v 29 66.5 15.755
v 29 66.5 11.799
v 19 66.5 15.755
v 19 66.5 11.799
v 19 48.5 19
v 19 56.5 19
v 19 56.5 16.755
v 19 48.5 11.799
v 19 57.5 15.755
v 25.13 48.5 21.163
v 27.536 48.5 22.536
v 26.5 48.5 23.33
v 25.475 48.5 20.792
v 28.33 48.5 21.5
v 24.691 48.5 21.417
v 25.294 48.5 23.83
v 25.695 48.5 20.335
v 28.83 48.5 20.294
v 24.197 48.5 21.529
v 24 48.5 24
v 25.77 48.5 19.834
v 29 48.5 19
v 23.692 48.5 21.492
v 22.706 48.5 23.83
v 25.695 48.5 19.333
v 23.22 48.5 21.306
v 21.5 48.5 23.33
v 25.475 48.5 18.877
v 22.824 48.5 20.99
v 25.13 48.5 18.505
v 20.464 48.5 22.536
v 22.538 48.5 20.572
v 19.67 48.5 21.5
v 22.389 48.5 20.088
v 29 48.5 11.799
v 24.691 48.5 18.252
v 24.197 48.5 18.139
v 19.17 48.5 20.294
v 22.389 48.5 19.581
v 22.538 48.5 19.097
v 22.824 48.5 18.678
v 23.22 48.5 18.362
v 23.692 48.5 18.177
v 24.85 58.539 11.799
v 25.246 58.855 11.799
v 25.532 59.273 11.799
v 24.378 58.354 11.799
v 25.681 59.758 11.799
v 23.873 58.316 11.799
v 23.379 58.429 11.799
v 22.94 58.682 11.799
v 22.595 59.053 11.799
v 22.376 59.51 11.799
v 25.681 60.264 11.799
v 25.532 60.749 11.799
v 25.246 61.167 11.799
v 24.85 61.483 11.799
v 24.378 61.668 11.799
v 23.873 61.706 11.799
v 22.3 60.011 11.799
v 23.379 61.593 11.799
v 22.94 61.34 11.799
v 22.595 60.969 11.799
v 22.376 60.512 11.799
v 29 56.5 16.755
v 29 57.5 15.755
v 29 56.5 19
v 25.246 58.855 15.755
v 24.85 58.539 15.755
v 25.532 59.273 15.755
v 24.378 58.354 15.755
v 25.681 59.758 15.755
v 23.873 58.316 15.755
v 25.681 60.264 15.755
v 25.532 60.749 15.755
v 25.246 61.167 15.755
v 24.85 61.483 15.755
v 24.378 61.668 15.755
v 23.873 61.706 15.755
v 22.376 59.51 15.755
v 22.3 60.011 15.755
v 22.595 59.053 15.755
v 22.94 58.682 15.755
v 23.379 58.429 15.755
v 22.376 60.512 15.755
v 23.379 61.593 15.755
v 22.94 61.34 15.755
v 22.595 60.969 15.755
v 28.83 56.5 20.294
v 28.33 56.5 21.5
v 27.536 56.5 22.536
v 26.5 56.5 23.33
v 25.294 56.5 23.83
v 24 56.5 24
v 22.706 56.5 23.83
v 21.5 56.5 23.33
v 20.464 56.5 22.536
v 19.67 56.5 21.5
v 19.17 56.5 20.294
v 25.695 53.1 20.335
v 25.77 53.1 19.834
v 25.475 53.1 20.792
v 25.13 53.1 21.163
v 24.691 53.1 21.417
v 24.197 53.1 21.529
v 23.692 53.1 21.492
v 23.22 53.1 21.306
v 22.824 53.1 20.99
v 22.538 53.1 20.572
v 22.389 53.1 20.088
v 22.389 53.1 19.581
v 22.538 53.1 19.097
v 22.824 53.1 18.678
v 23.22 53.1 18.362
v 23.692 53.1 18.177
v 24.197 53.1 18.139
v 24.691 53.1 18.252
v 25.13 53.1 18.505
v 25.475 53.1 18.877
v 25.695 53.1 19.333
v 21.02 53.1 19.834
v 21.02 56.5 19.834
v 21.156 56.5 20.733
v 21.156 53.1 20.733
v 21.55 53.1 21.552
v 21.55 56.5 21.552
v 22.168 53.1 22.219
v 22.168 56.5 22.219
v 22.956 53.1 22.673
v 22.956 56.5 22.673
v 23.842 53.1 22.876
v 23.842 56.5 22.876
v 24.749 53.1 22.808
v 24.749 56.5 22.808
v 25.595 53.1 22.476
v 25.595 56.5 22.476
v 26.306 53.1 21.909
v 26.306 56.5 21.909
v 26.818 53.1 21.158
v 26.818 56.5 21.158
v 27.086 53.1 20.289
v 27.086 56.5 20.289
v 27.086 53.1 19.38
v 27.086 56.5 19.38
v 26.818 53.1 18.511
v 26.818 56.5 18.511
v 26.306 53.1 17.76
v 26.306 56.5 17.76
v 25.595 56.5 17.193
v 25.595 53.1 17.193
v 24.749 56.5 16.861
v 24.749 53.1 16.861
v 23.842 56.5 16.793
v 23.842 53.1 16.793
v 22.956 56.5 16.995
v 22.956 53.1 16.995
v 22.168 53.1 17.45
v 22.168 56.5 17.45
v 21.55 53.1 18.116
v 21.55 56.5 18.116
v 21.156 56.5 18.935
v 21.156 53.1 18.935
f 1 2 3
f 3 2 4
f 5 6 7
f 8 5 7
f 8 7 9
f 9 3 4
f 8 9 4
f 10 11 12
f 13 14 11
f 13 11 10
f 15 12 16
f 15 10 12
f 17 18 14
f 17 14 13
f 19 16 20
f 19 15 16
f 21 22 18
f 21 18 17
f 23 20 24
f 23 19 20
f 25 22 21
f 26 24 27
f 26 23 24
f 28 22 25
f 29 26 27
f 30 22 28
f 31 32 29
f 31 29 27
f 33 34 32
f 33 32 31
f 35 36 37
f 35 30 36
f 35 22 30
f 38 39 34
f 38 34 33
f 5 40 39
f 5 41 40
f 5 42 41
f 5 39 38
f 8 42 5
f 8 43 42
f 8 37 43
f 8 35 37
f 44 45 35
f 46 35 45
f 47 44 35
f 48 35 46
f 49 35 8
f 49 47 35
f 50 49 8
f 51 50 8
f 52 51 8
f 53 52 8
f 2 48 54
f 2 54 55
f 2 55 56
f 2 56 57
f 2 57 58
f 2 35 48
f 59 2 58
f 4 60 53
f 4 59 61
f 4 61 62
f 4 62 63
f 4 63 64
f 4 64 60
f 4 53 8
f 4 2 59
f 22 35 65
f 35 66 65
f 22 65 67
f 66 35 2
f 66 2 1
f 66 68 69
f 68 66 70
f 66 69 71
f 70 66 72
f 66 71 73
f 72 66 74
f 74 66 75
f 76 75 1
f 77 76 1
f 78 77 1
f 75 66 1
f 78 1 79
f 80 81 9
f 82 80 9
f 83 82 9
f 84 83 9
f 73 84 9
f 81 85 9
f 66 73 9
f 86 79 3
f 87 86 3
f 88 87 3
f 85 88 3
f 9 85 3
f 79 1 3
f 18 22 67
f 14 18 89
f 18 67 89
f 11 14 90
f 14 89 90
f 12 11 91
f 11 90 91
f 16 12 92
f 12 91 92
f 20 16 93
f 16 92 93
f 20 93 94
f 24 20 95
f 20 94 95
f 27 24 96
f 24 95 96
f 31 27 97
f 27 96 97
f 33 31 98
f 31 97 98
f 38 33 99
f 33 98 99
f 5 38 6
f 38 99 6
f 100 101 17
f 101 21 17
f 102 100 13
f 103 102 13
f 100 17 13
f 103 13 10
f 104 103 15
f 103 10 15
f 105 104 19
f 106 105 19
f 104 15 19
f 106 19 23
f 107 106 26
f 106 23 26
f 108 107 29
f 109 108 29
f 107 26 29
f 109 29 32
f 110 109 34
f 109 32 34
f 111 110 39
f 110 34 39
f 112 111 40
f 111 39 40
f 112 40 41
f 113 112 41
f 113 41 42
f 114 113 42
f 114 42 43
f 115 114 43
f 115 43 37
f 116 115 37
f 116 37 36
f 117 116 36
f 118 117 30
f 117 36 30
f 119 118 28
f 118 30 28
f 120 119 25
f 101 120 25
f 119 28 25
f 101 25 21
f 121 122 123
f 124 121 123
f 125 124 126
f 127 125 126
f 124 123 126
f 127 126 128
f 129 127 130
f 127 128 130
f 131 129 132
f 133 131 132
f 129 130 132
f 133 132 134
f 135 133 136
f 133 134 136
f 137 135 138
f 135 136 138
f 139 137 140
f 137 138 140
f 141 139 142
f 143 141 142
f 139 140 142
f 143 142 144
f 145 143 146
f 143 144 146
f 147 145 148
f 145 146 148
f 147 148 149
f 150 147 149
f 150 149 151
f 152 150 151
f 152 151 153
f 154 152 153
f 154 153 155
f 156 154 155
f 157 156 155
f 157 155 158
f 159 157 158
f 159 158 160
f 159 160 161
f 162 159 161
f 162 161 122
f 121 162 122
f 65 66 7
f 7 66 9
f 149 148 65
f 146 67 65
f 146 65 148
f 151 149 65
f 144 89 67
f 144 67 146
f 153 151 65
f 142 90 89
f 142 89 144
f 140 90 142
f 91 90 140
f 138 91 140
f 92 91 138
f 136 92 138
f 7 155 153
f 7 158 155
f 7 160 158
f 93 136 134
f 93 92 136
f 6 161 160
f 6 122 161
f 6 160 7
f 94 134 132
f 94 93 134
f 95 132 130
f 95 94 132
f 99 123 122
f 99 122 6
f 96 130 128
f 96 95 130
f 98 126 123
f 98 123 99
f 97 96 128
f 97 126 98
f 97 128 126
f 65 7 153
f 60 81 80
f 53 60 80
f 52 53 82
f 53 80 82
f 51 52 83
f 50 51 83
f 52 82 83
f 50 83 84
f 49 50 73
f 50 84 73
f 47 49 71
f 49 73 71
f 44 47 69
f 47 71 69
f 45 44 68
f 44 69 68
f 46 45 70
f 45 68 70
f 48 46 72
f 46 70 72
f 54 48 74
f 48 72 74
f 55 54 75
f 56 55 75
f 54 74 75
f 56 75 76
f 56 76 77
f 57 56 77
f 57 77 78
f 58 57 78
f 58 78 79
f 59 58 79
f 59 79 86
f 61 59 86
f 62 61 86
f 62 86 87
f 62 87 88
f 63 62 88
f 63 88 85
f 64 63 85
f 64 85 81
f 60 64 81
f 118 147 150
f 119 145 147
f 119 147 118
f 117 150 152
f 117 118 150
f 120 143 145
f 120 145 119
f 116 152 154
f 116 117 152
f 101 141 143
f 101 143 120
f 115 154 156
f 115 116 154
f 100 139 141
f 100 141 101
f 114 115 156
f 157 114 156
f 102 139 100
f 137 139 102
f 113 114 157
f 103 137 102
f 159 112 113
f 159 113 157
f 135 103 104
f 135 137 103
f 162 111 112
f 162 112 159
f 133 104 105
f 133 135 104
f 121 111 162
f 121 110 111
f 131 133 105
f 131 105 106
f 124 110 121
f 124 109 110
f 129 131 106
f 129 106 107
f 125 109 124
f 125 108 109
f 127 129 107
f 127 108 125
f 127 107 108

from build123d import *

# Parameters (mm, degrees)
PAD020_DEPTH            = 18
SKETCH034_W             = 12.810354
SKETCH034_H             = 8.636197
POCKET003_DEPTH         = 10
HOLE007_D               = 3.4
HOLE007_DEPTH           = 25
HOLE007_CBORE_D         = 6.1
HOLE007_CBORE_DEPTH     = 3.4
SKETCH037_R             = 1.7
HOLE008_DEPTH           = 25
CHAMFER001_SIZE         = 1
BODY020_PLACEMENT_ANGLE = 180


with BuildPart() as part:
    # Sketch033 → Pad020 (new body)
    with BuildSketch(Plane.XZ):
        with BuildLine():
            ThreePointArc((-5, 0), (0, -5), (5, 0))
            Line((5, 0), (5, 7.200889))
            Line((-5, 7.200889), (5, 7.200889))
            Line((-5, 7.200889), (-5, 0))
        make_face()
    extrude(amount=PAD020_DEPTH)

    # Sketch034 (on Face5 of Pad020) → Pocket003 (cut)
    with BuildSketch(Plane(origin=(0, 0, 0), x_dir=(1, 0, 0), z_dir=(0, 1, 0))):
        with Locations((-0.681749, 1.0732765)):
            Rectangle(SKETCH034_W, SKETCH034_H)
    extrude(amount=-POCKET003_DEPTH, mode=Mode.SUBTRACT)

    # Hole007
    with Locations(Plane(origin=(0, -10, 0), x_dir=(1, 0, 0), z_dir=(0, 1, 0))):
        with Locations((-0.07012, 0.834162)):
            CounterBoreHole(HOLE007_D / 2, HOLE007_CBORE_D / 2, HOLE007_CBORE_DEPTH, depth=HOLE007_DEPTH)

    # Sketch037 (on Face6 of Hole007) → Hole008 (cut)
    with BuildSketch(Plane(origin=(0, 0, 3.244822), x_dir=(1, 0, 0), z_dir=(0, 0, -1))):
        with Locations((0, 6.488995)):
            Circle(SKETCH037_R)
    extrude(amount=-HOLE008_DEPTH, mode=Mode.SUBTRACT)

    # Chamfer001
    chamfer001_edges = [part.edges().sort_by_distance(p)[0] for p in [
        (0, -10, 3.244822),
    ]]
    chamfer(chamfer001_edges, length=CHAMFER001_SIZE)


with BuildPart() as part_1:
    # Body020 placement: moved
    add(part.part.moved(Location((24, 66.5, 19))).rotate(Axis((24, 66.5, 19), (0, 1, 0)), BODY020_PLACEMENT_ANGLE))


solid = part_1.part
